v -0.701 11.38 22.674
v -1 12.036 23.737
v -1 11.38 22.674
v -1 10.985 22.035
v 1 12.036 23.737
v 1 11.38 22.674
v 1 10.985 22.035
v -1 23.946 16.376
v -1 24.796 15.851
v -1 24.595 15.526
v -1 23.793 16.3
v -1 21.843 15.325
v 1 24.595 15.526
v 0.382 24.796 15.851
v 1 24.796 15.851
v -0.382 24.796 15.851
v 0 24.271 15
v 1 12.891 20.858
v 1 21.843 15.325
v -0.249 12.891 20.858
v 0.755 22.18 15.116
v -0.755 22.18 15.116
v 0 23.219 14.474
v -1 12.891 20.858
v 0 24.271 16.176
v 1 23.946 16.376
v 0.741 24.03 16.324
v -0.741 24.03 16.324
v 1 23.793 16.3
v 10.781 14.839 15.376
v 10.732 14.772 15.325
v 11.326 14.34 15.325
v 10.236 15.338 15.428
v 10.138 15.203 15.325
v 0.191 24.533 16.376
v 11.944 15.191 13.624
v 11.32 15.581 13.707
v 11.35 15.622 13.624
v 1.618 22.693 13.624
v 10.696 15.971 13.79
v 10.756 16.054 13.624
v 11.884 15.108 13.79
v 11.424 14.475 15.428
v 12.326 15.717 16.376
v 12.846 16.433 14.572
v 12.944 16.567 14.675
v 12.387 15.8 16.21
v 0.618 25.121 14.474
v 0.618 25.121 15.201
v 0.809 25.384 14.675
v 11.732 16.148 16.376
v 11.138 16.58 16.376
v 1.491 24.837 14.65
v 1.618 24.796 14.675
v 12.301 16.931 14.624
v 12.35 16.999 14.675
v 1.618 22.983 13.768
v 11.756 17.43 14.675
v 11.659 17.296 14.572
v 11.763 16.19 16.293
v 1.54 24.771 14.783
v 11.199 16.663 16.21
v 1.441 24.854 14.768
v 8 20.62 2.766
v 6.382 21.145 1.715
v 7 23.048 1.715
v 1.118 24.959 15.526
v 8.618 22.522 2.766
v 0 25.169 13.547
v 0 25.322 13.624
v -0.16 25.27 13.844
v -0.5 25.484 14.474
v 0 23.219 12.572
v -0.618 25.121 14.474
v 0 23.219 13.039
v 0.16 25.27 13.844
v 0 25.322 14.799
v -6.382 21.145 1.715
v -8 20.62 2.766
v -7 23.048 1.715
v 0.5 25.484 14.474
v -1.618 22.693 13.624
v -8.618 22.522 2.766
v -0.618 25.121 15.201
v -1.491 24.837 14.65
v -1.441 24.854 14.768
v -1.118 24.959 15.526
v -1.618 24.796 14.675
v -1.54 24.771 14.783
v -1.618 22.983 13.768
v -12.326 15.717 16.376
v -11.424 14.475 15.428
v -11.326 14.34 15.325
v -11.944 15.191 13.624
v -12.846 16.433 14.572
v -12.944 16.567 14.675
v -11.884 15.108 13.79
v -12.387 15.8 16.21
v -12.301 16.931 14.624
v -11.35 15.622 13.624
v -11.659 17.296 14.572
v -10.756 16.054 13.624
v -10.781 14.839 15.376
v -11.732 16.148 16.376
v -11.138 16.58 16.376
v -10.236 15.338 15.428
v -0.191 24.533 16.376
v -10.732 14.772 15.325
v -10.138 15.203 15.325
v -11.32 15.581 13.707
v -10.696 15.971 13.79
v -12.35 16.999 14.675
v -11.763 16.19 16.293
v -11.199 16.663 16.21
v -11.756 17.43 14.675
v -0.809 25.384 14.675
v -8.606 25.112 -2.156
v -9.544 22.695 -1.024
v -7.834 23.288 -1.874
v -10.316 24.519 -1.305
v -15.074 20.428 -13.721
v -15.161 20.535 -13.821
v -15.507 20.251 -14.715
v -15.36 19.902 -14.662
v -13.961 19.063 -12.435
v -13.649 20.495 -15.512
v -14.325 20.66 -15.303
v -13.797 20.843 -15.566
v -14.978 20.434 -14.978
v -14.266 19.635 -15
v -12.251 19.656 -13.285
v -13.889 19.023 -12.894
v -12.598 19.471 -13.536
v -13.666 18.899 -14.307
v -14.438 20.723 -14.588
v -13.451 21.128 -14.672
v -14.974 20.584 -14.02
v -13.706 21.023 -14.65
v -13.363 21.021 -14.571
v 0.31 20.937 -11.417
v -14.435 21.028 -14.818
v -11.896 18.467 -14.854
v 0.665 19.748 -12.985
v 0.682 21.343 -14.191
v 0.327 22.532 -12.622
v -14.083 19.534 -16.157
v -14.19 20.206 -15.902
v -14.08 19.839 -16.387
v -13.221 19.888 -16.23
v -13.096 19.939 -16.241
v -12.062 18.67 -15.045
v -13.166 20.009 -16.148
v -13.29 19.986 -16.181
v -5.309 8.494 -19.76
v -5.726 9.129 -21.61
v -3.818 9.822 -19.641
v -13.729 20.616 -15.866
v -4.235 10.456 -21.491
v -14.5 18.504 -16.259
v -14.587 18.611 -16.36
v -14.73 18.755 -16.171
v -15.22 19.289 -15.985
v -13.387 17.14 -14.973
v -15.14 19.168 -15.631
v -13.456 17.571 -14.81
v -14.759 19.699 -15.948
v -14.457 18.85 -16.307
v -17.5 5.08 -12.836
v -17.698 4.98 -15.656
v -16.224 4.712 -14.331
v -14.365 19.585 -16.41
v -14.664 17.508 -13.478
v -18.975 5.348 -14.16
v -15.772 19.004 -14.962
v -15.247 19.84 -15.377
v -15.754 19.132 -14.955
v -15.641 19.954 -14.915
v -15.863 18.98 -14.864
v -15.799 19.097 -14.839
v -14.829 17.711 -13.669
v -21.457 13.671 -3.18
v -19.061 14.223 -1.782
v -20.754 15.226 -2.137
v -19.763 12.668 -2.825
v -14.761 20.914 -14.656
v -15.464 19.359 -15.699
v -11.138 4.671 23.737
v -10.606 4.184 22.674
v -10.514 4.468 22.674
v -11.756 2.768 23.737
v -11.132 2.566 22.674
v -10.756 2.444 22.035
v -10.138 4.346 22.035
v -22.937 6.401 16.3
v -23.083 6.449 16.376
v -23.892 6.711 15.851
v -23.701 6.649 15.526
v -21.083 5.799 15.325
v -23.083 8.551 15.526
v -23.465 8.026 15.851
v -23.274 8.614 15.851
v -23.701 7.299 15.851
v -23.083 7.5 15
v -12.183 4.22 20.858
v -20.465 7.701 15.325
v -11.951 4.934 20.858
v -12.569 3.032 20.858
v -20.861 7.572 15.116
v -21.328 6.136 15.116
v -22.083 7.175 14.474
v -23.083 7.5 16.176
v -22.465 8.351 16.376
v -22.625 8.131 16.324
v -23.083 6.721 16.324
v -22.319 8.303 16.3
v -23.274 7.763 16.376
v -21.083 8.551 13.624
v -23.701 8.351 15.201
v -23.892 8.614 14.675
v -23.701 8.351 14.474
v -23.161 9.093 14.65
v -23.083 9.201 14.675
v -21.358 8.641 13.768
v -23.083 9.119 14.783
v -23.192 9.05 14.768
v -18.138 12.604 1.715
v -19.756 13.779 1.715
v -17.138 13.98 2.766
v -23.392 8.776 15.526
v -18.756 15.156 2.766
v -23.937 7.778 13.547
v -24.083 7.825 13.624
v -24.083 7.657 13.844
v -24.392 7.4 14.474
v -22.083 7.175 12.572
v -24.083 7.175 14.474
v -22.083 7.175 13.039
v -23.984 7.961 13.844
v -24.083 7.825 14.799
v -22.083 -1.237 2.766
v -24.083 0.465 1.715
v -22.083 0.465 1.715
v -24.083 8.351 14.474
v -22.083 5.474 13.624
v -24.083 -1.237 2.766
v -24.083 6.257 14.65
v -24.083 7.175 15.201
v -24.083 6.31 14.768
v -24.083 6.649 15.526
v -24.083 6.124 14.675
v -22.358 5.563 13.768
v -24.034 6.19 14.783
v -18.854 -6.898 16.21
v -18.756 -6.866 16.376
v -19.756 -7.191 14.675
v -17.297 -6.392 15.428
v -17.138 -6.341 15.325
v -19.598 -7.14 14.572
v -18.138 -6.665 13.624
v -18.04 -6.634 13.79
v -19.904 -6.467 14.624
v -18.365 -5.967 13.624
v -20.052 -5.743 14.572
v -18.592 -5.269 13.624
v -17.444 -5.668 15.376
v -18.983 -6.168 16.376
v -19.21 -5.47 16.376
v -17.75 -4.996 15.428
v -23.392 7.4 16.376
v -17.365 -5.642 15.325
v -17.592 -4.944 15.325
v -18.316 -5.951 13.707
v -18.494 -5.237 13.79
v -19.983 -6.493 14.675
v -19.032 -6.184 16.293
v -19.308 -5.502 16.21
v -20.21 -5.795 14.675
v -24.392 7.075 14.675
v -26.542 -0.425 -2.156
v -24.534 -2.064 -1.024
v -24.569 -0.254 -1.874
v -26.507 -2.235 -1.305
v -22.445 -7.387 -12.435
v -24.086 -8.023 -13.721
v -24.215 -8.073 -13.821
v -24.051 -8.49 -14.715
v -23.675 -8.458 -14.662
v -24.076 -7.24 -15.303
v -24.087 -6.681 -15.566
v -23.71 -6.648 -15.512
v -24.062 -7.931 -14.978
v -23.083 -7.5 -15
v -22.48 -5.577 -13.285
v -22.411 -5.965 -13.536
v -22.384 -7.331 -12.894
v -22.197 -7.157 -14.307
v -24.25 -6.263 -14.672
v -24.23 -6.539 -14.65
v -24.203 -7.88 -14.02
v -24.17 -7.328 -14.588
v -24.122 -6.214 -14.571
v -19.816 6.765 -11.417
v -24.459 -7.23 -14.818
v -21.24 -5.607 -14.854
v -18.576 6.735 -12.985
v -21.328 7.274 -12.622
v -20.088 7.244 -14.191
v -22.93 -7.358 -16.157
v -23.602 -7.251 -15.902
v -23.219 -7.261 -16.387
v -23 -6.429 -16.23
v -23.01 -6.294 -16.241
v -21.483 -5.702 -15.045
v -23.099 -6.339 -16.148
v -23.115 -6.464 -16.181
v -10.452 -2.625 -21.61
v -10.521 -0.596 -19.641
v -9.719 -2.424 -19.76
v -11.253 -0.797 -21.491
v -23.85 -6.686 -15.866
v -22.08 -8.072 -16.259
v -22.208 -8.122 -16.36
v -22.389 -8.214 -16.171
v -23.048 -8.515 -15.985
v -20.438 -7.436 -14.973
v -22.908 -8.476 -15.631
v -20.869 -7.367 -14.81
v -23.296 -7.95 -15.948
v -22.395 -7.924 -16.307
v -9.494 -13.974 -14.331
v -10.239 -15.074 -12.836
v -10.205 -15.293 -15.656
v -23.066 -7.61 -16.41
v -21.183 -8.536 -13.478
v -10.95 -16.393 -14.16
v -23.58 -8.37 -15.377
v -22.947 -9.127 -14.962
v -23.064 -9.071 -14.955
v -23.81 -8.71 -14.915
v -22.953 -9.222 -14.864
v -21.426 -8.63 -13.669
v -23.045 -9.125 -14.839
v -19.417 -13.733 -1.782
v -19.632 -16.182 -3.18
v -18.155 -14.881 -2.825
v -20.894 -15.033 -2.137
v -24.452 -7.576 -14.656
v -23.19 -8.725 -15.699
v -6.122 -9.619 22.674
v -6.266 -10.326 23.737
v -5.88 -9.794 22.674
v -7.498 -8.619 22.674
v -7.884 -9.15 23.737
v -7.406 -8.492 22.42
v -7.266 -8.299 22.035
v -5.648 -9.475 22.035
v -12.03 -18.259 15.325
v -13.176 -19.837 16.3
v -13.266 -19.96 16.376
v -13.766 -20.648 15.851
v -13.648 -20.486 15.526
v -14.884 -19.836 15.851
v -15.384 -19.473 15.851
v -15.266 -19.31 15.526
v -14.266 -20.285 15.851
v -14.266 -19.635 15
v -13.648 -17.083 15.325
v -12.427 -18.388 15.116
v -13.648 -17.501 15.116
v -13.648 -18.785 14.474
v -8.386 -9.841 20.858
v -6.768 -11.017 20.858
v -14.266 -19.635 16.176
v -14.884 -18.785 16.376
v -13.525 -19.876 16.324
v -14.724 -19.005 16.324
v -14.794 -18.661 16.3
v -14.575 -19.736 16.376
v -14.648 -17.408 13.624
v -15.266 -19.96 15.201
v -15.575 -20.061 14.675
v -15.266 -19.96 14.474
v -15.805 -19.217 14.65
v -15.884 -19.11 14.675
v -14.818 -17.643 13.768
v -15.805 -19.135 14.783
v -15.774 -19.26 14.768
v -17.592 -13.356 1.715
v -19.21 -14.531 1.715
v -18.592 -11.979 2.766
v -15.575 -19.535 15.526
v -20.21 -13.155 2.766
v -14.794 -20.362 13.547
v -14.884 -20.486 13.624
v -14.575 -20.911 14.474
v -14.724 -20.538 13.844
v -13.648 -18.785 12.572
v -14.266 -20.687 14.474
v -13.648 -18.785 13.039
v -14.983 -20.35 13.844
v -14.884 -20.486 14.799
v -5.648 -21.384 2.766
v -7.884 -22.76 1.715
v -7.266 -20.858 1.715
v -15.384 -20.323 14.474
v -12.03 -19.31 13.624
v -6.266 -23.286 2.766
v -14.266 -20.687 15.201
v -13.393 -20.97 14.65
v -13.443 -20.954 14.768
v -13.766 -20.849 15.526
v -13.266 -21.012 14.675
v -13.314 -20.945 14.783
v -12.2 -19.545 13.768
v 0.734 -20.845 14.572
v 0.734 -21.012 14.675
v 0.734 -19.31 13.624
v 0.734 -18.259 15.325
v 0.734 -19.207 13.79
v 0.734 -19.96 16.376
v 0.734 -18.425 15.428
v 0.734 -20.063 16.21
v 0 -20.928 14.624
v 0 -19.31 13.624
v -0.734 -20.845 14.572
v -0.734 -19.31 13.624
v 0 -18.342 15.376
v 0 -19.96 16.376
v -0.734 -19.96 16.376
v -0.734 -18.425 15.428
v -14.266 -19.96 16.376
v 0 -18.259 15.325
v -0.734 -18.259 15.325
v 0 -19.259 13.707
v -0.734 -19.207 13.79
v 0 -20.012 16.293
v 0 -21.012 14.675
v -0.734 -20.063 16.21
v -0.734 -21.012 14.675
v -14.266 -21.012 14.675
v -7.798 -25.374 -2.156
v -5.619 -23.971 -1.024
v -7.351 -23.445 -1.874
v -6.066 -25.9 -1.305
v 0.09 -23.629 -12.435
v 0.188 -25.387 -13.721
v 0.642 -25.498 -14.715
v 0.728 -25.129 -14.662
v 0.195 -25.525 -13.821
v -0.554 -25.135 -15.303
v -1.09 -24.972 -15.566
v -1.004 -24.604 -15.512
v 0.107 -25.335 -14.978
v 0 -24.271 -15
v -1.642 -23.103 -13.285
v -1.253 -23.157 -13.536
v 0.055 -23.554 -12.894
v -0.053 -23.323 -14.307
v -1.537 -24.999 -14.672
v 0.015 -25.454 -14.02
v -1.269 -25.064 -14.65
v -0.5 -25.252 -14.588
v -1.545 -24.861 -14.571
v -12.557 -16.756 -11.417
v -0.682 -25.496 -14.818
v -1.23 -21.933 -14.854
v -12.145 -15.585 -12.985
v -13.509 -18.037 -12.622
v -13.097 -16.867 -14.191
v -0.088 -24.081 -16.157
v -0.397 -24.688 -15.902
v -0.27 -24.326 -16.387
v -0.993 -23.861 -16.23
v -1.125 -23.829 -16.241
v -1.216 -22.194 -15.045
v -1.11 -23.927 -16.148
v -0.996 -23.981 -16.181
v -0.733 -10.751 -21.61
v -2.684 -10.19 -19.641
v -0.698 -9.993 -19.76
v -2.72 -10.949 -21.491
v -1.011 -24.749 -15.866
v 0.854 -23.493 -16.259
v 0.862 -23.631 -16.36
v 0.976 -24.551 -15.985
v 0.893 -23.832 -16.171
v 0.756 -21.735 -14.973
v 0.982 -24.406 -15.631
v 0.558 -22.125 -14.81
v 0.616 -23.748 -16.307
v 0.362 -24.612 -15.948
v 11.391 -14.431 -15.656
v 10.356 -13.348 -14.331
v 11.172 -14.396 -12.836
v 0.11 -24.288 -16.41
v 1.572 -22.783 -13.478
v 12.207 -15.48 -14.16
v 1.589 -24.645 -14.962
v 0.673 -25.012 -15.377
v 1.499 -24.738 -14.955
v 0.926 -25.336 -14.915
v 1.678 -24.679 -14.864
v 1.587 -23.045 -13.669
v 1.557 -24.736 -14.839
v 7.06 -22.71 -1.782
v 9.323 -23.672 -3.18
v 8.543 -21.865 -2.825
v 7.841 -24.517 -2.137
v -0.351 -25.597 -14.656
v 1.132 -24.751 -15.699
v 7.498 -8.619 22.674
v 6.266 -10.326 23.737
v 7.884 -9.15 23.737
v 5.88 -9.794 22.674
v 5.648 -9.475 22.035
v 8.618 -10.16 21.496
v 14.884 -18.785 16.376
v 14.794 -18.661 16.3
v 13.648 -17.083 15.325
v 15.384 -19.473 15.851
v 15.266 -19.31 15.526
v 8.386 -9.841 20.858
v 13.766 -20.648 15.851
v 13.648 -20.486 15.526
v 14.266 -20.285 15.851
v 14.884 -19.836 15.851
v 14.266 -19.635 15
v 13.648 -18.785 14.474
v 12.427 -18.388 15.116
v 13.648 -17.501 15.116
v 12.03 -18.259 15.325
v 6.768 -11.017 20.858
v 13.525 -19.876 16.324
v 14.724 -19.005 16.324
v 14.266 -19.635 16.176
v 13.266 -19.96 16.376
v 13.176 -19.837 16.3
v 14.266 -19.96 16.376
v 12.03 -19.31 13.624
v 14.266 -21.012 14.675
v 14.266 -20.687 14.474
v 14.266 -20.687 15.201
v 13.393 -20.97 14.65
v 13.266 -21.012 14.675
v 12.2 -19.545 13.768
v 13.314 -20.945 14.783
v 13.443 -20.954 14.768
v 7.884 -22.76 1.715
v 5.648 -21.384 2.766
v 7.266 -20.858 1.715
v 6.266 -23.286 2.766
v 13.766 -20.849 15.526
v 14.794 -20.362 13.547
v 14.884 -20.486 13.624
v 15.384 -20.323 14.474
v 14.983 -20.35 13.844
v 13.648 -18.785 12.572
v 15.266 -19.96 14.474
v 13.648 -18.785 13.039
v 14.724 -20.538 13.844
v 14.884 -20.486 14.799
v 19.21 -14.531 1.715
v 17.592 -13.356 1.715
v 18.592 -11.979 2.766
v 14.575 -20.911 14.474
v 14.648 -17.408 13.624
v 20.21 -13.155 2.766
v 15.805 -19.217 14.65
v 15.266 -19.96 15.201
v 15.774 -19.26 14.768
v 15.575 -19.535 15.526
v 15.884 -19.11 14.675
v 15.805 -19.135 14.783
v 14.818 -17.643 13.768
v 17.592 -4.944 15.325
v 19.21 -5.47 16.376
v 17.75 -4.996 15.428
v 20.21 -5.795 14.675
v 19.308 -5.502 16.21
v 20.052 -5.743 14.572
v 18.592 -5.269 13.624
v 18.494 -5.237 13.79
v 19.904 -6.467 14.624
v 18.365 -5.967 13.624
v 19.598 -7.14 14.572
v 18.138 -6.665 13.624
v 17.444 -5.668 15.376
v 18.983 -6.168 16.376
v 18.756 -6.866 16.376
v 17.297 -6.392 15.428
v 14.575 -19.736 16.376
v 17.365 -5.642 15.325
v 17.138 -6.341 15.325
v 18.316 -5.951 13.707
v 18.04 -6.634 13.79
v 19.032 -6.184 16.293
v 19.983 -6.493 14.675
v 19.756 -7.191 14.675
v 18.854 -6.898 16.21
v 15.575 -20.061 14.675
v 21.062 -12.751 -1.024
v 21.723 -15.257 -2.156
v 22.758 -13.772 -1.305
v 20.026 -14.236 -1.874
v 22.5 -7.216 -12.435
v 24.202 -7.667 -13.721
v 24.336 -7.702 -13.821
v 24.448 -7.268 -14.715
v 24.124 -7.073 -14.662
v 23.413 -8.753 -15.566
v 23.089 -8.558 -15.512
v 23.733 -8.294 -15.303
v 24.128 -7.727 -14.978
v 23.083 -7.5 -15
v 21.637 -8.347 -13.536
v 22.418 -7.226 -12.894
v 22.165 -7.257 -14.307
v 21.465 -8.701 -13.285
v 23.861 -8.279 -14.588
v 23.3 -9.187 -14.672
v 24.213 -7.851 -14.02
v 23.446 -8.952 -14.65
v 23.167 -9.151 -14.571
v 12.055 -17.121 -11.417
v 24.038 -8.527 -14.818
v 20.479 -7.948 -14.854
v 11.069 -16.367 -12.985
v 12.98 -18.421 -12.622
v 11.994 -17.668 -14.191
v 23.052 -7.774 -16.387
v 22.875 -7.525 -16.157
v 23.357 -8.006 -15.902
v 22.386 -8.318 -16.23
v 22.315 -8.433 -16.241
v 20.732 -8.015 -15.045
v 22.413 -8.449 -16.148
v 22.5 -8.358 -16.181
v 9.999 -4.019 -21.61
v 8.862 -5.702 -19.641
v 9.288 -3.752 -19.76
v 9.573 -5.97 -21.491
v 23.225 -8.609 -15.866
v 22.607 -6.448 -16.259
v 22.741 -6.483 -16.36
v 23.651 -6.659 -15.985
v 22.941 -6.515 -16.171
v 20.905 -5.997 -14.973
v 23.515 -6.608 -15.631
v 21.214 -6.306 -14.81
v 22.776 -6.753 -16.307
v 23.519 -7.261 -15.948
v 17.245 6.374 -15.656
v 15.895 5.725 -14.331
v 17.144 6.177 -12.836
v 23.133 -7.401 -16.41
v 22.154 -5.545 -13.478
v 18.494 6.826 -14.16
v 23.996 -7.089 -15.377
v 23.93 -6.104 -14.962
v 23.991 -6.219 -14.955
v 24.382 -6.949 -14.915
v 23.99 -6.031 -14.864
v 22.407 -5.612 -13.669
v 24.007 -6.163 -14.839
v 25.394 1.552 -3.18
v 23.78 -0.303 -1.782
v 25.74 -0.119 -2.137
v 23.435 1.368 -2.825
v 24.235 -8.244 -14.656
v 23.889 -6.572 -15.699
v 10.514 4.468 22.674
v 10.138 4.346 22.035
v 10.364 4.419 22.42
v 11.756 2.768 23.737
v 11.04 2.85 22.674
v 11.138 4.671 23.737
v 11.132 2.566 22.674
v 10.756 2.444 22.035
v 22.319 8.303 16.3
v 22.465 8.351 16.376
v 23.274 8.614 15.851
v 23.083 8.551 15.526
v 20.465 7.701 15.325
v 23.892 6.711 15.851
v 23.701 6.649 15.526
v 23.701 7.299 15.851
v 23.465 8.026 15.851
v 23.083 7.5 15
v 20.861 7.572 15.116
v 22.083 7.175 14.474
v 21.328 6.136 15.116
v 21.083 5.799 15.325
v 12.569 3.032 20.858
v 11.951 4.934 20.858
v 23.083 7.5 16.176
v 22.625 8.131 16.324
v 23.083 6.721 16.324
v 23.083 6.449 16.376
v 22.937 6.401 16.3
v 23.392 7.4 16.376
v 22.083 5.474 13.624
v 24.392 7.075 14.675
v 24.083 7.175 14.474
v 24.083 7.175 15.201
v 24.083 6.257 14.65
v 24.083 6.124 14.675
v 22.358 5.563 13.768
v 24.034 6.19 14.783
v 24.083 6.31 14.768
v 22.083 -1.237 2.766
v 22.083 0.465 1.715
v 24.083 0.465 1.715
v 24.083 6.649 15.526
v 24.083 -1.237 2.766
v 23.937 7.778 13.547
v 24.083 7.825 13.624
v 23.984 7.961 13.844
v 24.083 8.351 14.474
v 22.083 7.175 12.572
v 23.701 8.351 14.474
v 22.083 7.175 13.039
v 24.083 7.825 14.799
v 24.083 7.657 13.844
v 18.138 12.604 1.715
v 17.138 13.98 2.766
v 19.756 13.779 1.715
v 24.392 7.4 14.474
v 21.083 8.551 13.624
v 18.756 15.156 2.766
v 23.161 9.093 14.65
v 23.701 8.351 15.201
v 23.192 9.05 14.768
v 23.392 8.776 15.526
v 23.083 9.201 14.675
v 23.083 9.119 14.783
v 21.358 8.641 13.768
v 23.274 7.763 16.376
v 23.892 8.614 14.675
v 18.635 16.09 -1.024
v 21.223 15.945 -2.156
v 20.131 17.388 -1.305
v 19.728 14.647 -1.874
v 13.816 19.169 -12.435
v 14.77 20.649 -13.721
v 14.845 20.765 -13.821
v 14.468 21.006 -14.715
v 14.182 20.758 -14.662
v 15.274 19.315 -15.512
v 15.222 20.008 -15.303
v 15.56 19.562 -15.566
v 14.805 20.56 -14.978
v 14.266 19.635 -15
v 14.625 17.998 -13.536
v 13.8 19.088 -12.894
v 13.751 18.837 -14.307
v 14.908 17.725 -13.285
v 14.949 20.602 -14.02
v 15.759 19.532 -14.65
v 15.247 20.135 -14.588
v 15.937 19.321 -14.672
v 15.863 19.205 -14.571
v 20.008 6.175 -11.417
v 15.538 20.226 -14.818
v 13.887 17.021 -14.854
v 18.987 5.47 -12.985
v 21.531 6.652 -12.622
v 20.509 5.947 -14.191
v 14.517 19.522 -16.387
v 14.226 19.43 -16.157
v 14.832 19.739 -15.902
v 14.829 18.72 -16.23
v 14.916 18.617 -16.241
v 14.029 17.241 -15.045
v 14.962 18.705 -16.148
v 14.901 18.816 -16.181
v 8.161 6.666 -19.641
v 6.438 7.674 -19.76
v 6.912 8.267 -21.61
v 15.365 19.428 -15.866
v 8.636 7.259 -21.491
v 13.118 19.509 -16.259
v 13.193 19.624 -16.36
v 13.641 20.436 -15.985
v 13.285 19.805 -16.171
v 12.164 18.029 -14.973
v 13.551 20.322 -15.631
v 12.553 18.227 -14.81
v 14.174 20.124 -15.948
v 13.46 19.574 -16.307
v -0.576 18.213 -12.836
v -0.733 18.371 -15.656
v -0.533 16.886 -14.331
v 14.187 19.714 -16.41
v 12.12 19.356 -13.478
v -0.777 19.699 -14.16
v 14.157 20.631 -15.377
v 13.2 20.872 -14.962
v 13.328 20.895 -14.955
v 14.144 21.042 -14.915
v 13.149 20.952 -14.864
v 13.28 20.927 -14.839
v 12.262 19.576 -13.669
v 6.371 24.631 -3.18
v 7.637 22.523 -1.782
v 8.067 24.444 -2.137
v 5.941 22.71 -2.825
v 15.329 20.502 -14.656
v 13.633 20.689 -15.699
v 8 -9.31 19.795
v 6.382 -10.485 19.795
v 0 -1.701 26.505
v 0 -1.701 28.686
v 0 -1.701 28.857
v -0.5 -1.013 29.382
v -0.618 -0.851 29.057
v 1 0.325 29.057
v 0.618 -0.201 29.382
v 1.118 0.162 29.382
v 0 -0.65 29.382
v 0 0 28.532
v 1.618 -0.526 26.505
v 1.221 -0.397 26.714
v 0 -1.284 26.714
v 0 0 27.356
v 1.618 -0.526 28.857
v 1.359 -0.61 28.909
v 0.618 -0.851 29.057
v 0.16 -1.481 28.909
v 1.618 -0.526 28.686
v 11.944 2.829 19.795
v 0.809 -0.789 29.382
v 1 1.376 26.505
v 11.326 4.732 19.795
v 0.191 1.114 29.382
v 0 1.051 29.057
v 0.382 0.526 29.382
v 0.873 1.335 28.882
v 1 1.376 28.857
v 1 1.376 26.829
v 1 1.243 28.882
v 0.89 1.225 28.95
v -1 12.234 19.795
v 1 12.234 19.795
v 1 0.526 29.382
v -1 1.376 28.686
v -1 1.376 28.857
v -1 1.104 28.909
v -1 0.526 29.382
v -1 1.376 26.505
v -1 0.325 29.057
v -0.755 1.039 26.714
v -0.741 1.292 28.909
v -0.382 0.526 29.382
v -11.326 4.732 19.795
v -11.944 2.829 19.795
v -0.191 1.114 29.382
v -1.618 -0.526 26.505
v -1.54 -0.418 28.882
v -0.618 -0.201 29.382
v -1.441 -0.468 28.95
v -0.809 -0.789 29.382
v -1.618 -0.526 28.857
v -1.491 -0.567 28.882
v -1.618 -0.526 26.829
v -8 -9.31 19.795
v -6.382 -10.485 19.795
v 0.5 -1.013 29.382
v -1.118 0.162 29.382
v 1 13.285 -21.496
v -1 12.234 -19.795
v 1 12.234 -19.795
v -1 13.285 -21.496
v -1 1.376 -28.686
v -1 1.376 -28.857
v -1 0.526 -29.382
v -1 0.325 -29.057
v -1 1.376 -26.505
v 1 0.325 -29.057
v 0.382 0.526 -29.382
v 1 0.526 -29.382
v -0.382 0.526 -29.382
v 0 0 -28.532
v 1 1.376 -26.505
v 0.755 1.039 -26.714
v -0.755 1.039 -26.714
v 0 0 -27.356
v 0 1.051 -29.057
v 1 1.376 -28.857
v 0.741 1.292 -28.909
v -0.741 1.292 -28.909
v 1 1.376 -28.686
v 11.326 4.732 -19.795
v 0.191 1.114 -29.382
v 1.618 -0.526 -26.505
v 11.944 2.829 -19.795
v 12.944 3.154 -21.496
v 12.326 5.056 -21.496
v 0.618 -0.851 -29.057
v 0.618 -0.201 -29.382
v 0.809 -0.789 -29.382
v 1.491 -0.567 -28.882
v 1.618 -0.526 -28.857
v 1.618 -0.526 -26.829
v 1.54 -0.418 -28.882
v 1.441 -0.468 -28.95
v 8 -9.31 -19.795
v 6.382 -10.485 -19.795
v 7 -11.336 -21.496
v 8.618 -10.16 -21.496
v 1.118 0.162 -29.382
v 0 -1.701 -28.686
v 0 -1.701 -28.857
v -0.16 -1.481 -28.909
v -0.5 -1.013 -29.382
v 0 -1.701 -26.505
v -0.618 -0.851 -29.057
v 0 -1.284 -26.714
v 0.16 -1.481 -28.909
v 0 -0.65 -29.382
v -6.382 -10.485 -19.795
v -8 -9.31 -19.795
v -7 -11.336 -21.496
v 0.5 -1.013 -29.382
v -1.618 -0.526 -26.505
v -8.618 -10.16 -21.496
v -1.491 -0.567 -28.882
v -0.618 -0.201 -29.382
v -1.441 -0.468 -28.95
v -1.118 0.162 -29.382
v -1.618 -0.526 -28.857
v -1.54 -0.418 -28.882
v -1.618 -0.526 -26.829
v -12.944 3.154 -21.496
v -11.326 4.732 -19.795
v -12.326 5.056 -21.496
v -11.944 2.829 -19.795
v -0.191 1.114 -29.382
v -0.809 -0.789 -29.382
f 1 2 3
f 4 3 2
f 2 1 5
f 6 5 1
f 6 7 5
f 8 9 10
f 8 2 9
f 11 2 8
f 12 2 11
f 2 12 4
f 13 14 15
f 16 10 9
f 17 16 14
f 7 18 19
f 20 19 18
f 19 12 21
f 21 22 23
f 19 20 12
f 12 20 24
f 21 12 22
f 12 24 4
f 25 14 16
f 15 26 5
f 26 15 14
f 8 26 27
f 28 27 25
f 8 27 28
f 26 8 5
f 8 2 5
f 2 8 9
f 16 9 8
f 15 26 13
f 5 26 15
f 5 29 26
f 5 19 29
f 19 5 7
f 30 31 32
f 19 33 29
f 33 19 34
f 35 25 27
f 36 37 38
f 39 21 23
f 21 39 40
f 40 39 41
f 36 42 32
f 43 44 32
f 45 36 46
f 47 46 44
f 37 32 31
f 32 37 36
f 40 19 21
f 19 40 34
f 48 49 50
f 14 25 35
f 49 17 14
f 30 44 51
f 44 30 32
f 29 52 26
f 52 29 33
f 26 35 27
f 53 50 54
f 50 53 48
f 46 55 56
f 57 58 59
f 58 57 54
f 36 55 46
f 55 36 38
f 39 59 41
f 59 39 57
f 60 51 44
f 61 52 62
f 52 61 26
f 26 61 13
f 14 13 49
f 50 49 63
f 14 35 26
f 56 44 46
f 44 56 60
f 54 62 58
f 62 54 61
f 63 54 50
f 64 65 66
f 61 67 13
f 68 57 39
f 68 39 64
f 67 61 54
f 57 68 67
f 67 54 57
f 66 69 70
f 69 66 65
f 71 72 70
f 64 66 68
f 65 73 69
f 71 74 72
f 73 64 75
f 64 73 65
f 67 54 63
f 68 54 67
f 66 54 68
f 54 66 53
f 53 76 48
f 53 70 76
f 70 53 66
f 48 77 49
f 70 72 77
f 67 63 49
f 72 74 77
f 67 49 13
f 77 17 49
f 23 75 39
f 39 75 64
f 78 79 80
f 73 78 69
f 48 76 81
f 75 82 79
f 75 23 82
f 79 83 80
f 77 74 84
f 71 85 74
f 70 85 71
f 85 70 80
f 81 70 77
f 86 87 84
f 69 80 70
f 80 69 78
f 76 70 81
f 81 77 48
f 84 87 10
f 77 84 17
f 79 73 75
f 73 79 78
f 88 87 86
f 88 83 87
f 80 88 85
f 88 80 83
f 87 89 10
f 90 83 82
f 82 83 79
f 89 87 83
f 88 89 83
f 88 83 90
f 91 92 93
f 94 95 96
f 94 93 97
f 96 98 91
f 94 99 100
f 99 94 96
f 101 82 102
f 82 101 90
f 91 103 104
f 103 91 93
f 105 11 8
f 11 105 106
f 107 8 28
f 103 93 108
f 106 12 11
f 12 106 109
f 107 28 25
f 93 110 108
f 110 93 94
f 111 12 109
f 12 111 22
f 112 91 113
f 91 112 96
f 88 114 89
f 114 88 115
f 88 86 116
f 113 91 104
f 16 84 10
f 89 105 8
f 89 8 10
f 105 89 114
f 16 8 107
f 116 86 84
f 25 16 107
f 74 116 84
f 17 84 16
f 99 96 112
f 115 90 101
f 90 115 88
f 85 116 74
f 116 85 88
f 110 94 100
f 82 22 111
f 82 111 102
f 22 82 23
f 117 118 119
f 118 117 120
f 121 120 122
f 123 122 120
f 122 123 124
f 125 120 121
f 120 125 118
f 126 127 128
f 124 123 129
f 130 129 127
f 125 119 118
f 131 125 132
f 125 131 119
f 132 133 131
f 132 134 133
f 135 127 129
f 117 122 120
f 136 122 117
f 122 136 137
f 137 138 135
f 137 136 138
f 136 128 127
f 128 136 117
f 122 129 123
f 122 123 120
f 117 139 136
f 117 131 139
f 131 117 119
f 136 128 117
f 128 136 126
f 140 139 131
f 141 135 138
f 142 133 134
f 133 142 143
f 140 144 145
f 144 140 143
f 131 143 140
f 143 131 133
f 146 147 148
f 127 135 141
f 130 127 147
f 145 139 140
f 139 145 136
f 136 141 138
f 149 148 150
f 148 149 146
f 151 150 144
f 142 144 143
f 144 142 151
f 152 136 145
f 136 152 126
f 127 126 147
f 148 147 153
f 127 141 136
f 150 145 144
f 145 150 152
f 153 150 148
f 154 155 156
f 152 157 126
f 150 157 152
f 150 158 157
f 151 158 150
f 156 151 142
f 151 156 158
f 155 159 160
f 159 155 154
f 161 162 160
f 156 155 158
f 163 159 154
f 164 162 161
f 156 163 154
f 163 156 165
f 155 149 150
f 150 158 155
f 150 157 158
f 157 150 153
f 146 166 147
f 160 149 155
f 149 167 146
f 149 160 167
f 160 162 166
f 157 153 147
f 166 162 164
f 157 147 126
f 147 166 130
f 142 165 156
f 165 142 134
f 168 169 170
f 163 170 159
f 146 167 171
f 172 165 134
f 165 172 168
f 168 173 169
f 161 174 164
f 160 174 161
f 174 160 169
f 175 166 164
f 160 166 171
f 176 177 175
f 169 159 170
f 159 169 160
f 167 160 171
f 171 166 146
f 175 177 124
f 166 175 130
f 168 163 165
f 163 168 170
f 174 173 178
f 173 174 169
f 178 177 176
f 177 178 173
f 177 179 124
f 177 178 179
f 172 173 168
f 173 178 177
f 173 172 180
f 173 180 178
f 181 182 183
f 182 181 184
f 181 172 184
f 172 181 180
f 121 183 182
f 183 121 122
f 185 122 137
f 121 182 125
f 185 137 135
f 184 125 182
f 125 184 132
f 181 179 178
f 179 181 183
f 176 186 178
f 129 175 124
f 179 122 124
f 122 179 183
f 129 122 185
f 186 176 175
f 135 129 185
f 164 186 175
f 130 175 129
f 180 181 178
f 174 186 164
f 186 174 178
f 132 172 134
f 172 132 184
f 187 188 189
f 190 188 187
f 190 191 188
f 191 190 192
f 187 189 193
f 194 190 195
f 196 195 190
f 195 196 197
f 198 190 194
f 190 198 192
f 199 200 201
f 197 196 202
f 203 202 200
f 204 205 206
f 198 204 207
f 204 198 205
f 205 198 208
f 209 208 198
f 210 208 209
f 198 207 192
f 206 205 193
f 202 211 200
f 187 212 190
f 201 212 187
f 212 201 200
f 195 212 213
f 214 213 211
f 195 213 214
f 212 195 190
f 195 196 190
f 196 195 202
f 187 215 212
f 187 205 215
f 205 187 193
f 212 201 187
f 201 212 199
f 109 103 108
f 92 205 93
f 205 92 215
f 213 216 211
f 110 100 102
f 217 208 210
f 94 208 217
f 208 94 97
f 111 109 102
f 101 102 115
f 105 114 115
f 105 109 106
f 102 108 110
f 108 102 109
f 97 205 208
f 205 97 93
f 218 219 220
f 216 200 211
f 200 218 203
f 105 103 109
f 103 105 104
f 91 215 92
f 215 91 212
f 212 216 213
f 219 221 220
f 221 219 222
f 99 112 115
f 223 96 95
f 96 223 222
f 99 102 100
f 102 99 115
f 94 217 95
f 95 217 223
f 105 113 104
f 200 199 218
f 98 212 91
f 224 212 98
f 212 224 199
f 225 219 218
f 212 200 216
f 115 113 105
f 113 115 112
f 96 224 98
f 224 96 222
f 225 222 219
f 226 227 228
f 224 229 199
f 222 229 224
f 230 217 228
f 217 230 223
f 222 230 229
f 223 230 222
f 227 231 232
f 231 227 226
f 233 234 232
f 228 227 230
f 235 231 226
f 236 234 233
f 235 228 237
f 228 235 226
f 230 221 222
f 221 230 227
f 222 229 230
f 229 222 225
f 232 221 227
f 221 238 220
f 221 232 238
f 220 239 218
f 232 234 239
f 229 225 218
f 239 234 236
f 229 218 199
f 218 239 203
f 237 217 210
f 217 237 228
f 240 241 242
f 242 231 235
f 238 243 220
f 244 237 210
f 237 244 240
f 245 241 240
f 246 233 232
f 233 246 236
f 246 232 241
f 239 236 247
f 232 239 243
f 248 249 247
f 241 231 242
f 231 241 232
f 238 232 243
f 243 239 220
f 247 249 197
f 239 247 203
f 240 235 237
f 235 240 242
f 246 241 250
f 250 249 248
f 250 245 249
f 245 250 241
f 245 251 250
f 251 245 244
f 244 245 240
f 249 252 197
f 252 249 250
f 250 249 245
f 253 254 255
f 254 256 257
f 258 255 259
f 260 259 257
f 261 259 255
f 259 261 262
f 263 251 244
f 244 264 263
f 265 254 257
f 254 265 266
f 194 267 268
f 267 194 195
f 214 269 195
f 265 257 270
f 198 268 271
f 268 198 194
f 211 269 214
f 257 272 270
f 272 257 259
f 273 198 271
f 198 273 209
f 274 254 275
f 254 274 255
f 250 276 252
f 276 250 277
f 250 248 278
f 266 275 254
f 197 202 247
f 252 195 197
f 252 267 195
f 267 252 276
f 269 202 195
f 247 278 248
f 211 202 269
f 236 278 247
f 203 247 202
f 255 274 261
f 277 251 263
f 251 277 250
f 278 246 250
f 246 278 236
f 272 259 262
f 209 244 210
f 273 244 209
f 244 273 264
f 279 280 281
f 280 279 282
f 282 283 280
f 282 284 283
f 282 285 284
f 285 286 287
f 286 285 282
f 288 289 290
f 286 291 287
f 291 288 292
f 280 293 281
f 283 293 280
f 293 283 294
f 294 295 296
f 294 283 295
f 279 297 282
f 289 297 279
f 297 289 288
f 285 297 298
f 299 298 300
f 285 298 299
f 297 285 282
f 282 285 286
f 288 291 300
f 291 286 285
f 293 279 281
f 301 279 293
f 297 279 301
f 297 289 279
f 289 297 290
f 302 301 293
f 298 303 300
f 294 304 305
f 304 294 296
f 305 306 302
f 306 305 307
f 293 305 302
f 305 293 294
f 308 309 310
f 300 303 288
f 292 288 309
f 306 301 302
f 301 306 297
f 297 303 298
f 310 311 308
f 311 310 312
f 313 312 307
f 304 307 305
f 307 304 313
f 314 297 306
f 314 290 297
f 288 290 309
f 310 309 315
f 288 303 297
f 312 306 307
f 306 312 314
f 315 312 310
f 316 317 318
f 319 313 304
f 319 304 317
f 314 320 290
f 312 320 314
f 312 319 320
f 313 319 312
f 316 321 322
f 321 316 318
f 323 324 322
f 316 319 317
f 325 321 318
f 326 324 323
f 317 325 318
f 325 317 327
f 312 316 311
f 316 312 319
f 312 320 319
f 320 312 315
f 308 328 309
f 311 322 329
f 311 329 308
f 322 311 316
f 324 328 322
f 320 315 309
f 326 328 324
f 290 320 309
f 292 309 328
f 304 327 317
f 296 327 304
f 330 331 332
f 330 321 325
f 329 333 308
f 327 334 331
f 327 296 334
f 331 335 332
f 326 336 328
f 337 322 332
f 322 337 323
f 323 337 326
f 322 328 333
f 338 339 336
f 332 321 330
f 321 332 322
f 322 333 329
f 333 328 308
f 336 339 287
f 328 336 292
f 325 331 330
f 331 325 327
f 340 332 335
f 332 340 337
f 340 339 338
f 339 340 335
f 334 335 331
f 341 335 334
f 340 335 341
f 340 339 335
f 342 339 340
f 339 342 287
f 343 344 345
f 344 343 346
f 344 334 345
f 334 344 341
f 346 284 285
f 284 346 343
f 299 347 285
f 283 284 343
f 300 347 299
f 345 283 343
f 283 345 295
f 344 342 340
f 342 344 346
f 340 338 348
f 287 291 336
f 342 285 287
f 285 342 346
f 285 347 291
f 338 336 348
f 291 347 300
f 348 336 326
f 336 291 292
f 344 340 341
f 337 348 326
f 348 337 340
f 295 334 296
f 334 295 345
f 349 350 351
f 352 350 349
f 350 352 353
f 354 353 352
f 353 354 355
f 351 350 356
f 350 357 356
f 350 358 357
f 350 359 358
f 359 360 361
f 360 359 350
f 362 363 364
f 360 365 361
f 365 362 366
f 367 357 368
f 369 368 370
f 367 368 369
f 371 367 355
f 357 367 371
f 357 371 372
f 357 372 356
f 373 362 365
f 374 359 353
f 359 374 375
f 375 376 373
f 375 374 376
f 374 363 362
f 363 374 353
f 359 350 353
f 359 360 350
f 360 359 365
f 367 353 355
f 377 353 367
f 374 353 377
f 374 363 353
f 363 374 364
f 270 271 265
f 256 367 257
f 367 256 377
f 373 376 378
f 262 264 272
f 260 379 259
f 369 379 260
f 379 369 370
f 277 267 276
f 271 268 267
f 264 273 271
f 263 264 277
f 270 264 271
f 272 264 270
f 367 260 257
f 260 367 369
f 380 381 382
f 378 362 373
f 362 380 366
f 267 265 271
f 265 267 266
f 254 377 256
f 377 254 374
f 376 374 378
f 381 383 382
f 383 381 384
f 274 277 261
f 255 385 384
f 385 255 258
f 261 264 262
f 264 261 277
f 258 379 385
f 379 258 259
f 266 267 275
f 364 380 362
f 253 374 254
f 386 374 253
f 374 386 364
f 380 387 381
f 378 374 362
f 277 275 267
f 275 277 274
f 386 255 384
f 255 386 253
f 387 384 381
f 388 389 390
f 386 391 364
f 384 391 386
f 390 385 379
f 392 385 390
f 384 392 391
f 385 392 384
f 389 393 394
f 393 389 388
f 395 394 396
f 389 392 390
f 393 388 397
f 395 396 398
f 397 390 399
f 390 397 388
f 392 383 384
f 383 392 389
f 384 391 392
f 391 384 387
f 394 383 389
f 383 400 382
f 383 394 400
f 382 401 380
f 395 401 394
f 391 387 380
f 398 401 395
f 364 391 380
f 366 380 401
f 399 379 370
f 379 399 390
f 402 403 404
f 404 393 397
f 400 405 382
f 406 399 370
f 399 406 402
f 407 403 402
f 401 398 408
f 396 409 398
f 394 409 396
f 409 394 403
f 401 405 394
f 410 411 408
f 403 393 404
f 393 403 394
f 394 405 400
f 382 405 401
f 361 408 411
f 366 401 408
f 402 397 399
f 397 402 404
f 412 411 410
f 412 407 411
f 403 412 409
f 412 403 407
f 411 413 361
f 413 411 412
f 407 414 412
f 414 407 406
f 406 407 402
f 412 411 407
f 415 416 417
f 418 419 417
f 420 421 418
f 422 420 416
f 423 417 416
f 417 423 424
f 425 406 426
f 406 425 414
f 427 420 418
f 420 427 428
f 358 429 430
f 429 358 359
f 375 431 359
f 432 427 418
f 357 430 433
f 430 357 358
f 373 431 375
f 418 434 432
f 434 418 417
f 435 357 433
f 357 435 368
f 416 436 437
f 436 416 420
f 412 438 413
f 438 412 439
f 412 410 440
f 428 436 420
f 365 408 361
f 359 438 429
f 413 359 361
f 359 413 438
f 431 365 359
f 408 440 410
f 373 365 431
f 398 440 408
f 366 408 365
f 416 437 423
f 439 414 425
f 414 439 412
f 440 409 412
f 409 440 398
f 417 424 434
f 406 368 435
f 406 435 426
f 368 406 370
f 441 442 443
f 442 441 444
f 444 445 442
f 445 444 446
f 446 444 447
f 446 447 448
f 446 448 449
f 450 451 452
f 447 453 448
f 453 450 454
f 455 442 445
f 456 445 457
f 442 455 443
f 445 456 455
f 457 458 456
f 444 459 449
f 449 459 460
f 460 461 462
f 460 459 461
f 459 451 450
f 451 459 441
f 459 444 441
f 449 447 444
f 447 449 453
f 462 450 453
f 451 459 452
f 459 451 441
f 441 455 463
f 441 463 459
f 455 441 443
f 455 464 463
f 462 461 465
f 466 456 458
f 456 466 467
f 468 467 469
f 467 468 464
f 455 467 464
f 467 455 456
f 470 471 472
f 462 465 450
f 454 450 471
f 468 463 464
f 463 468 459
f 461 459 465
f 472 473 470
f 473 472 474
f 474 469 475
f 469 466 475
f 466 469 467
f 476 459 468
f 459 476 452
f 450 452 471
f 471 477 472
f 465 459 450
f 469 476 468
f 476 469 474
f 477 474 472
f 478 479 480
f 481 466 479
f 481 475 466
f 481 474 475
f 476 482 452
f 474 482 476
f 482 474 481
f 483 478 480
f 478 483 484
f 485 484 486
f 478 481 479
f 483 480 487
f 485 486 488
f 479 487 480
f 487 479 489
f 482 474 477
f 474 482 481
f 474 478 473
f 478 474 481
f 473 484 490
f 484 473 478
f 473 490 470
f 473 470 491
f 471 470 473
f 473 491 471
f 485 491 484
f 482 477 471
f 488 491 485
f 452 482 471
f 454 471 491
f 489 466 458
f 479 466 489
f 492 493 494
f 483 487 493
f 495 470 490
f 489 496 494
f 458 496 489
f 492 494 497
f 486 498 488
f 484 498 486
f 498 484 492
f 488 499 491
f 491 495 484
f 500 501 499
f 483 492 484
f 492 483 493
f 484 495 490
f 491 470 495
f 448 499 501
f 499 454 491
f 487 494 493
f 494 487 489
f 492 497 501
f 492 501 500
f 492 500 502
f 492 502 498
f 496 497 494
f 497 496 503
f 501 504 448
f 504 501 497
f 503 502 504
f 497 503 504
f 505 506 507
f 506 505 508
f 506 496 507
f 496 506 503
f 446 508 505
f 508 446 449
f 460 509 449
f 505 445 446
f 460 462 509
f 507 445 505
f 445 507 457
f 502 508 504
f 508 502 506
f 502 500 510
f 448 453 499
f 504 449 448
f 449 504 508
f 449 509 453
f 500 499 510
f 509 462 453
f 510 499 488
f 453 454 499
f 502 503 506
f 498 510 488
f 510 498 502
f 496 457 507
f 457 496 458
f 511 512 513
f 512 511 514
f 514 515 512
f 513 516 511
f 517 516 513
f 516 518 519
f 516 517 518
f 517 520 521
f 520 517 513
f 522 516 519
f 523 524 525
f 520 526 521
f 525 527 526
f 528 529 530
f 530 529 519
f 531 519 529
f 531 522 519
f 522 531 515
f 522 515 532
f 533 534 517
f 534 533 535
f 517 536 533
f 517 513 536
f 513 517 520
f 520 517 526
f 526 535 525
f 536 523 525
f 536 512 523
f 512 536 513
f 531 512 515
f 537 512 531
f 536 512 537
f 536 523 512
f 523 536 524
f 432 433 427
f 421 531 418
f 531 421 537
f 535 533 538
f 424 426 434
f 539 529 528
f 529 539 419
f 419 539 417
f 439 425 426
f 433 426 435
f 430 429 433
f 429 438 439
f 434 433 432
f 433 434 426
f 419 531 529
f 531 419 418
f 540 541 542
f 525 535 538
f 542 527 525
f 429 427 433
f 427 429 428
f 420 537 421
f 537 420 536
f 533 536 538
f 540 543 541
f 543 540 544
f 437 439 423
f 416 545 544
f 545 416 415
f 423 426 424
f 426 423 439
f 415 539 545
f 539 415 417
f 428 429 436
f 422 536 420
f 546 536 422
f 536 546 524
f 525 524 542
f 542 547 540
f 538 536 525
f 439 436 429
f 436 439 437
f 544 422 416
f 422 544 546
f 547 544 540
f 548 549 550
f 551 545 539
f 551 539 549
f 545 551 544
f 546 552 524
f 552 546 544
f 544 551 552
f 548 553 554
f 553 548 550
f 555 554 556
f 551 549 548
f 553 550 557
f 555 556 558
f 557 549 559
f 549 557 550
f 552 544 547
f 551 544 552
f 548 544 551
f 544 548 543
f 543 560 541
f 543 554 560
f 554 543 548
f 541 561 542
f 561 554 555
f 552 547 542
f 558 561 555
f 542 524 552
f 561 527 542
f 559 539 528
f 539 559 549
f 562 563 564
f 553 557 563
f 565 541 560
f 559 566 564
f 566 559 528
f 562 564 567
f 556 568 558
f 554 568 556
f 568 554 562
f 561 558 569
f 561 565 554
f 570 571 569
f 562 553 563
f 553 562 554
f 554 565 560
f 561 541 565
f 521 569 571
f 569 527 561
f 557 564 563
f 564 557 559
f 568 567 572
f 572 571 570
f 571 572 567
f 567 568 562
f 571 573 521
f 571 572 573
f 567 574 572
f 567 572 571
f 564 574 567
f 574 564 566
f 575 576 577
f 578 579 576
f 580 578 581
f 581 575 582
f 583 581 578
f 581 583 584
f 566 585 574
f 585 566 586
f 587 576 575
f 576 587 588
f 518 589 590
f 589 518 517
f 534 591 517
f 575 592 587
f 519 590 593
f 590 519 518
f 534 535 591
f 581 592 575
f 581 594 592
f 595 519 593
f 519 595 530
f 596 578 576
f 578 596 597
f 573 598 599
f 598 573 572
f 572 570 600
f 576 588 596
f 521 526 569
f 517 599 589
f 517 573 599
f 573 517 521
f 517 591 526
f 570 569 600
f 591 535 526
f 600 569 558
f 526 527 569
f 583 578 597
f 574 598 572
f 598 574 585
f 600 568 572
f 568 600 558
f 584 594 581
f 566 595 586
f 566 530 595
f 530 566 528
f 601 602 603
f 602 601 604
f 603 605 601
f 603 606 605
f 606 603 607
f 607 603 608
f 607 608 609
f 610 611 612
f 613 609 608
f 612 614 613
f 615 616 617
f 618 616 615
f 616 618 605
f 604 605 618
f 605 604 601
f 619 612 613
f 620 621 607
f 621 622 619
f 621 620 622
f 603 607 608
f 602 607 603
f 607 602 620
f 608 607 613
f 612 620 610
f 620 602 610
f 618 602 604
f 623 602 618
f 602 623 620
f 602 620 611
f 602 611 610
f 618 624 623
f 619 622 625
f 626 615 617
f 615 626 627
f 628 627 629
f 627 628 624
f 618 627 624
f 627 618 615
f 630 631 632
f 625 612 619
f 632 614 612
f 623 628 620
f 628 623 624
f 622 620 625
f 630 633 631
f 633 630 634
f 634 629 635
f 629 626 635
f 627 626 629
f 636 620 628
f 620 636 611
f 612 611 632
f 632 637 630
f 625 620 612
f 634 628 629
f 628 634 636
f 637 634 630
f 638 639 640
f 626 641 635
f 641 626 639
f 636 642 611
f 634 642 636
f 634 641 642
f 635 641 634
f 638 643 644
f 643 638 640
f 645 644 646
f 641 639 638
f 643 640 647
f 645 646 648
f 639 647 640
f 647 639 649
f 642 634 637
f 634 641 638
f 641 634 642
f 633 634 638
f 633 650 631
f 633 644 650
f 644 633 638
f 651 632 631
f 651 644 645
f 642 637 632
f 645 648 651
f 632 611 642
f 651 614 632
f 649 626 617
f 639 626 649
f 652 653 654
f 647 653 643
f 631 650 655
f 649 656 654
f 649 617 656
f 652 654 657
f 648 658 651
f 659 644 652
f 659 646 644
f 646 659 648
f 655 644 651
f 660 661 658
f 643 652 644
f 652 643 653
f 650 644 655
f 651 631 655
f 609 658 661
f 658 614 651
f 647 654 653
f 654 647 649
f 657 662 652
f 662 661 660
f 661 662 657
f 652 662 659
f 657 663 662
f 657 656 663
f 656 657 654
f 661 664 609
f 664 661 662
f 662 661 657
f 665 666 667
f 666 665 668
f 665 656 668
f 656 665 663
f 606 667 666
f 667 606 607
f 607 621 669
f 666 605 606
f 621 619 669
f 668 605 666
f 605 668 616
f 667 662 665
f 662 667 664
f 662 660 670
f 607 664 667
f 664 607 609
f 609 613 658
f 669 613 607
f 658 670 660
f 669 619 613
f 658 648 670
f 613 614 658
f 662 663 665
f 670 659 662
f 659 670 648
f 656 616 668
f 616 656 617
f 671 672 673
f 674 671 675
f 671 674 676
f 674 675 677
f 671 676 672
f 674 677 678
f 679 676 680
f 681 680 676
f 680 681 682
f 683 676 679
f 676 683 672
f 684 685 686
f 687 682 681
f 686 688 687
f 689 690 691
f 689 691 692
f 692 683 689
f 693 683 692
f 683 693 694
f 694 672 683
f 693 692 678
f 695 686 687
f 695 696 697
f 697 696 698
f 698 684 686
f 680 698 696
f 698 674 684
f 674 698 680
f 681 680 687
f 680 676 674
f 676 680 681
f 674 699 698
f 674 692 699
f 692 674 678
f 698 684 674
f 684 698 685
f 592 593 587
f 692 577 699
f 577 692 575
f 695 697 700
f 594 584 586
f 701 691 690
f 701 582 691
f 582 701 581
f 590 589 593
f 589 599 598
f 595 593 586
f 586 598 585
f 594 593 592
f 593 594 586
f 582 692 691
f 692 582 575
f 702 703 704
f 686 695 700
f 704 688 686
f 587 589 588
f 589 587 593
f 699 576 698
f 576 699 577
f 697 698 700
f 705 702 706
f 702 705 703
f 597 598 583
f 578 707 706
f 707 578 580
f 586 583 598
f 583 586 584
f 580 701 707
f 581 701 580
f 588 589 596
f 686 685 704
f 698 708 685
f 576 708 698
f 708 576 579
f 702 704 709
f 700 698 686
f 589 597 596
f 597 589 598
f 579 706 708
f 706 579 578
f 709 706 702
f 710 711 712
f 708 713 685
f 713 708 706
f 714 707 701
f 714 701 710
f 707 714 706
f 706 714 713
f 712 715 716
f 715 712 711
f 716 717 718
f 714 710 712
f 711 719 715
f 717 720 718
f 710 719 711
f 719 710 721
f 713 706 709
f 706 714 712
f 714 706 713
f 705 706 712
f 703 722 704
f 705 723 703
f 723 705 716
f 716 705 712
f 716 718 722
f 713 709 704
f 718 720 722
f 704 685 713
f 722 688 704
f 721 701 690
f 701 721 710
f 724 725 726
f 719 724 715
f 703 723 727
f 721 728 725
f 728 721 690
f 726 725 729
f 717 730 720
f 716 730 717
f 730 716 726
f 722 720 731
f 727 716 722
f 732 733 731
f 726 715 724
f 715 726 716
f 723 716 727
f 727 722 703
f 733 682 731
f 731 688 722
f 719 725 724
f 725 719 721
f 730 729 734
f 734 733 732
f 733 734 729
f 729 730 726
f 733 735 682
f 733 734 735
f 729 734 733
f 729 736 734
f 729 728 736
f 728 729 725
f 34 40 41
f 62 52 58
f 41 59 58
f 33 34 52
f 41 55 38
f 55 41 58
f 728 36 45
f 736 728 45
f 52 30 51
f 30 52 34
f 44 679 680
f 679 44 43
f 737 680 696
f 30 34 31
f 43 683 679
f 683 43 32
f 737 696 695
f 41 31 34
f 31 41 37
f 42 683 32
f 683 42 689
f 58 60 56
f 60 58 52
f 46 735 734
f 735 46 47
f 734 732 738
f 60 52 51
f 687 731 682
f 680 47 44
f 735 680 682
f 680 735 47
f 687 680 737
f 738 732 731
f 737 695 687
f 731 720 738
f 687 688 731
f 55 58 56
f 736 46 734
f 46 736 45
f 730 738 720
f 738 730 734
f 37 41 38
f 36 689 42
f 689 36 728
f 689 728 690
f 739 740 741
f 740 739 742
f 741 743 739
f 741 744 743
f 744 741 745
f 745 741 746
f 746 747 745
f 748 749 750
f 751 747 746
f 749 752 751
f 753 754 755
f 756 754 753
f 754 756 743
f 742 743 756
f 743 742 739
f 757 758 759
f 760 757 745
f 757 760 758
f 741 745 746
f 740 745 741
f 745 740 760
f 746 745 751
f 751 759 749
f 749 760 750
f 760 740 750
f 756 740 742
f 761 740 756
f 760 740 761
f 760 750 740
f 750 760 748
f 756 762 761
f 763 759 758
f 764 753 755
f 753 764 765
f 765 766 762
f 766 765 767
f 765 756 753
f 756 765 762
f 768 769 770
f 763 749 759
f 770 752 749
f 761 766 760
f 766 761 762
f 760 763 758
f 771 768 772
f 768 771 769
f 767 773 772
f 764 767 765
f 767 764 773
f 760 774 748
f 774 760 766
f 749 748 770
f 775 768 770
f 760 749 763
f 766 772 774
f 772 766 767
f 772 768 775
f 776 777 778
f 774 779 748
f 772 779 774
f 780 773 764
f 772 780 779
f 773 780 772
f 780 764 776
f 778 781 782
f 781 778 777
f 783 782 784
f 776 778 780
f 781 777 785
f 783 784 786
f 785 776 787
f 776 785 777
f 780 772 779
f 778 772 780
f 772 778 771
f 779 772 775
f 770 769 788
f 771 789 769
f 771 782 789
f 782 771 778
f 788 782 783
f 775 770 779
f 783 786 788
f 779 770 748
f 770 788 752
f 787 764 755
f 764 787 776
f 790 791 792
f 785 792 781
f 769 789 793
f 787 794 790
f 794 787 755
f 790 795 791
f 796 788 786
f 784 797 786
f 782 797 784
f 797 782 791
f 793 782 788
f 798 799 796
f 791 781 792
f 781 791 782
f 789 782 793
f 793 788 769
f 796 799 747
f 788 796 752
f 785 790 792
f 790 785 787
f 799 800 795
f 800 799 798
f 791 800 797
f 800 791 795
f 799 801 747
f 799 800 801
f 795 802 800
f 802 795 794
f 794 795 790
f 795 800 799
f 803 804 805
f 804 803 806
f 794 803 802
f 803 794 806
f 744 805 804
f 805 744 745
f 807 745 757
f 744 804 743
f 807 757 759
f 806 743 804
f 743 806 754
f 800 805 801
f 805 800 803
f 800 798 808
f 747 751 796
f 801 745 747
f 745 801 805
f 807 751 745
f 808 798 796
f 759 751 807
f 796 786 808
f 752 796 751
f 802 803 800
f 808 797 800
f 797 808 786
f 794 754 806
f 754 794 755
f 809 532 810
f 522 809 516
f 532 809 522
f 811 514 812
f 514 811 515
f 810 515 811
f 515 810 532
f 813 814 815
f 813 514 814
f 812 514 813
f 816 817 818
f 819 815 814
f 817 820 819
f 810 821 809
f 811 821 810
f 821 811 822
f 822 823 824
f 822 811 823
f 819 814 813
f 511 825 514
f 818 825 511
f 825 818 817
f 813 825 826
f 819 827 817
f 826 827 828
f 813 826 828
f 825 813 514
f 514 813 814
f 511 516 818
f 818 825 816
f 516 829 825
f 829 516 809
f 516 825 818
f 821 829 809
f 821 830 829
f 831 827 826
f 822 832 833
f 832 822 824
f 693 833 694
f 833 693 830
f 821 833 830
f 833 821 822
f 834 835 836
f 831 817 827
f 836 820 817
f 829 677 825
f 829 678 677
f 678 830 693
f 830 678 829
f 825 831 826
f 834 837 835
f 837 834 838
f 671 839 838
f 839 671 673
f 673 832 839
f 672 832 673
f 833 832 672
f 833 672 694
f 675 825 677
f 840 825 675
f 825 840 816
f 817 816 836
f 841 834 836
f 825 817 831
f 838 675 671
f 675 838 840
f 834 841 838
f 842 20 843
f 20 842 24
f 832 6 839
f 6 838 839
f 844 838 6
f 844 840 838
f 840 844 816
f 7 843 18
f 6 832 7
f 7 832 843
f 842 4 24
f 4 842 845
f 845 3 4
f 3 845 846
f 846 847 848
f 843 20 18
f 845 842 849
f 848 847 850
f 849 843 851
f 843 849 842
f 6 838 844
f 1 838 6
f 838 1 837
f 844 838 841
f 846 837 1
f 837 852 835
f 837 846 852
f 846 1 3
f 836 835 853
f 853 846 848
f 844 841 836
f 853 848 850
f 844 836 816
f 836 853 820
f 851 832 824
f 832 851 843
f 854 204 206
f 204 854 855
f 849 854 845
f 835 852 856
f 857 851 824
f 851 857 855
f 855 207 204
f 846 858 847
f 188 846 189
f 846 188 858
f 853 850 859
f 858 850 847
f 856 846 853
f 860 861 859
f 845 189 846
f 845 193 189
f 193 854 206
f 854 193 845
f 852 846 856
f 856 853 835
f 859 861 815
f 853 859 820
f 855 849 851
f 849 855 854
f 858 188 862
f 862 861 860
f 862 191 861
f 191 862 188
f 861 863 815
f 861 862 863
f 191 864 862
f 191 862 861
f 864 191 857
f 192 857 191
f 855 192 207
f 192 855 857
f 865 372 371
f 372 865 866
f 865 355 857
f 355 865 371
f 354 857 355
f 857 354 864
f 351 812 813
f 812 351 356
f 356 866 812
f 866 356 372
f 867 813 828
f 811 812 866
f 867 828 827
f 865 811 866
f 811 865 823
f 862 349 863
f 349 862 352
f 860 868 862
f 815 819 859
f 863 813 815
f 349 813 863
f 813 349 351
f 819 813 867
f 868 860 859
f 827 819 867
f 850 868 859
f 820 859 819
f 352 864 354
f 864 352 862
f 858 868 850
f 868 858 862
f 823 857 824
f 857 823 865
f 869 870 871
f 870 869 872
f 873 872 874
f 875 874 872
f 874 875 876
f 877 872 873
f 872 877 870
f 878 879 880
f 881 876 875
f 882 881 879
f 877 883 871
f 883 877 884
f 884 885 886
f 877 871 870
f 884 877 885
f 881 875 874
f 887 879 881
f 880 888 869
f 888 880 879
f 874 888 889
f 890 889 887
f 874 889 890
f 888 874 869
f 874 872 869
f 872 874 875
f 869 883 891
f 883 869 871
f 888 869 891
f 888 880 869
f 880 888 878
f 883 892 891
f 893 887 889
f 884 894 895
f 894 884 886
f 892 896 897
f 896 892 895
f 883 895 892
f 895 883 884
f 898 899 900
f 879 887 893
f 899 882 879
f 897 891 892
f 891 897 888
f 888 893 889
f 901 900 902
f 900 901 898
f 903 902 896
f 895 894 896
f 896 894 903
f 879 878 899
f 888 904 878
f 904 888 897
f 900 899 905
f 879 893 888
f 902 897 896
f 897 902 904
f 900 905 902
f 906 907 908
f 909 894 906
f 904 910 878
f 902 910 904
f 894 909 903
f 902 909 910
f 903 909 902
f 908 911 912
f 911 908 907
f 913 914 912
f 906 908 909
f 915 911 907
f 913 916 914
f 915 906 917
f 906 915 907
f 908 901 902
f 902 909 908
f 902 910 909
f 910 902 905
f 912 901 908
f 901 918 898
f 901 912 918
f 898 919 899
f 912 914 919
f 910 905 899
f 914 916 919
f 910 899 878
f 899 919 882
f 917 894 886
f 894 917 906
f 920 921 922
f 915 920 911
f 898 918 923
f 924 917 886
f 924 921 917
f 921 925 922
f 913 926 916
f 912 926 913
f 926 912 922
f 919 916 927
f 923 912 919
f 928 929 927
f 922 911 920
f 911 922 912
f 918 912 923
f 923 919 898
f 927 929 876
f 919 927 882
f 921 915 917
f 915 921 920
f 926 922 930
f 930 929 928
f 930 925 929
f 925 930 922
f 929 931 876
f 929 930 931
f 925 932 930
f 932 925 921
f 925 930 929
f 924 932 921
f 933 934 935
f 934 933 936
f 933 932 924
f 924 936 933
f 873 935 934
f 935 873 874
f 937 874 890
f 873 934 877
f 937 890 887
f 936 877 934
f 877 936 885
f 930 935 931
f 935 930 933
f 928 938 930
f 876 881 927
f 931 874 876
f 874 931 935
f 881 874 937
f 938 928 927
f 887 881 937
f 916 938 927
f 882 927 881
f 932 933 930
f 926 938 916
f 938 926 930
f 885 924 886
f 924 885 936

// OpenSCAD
side = 30;
faceheight = sqrt(3)/2*side;
phi = (1+sqrt(5))/2;
// dihedral angle
di = 2*asin(phi/sqrt(3));

// distance to vertex
dv = side*0.951056517;
// central angle
ca = 63.4349488;

module triangle(radius)
{
	o=radius/2; //equivalent to radius*sin(30)
	a=radius*sqrt(3)/2; //equivalent to radius*cos(30)
	polygon(points=[[-a,-o],[0,radius],[a,-o]],paths=[[0,1,2]]);
}

module reg_polygon(sides,radius)
{
function dia(r) = sqrt(pow(r*2,2)/2); //sqrt(r*2^2/2) if only we had an exponention op
if(sides<2) square([radius,0]);
if(sides==3) triangle(radius);
if(sides==4) square([dia(radius),dia(radius)],center=true);
if(sides>4) circle(r=radius,$fn=sides);
}
module pentagon(radius)
{
	reg_polygon(5,radius);
}

module node() {
	for ( i = [0 : 4] ) {
		rotate([90+31.71747441, 0, i * 360 / 5])
		translate([-1,-1,0])
		cube([2,2,15]);
	}
	//sphere(3);
}

for ( i = [0 : 4] )
{
	rotate([ca/2, 0, i * 360 / 5])
	rotate([0,0,0]) translate([0, dv, 0]) rotate([-(ca/2+ca),0,0]) {
		node();	
	}
	
	// todo: where did we get 36
	//rotate([-ca/2, 0, (i * 360 / 5)+36])
	rotate([-ca/2, 0, (i * 360 / 5)+36])
	translate([0, dv, 0]) rotate([-(ca/2+ca),30,0]) {
		node();
	}
}

// top
translate([0, 0, dv]) {
	rotate([0,0,36])
	node();
}
	
// bottom
translate([0, 0, -dv]) {
	rotate([180,0,0]) {
		node();
	}
}
